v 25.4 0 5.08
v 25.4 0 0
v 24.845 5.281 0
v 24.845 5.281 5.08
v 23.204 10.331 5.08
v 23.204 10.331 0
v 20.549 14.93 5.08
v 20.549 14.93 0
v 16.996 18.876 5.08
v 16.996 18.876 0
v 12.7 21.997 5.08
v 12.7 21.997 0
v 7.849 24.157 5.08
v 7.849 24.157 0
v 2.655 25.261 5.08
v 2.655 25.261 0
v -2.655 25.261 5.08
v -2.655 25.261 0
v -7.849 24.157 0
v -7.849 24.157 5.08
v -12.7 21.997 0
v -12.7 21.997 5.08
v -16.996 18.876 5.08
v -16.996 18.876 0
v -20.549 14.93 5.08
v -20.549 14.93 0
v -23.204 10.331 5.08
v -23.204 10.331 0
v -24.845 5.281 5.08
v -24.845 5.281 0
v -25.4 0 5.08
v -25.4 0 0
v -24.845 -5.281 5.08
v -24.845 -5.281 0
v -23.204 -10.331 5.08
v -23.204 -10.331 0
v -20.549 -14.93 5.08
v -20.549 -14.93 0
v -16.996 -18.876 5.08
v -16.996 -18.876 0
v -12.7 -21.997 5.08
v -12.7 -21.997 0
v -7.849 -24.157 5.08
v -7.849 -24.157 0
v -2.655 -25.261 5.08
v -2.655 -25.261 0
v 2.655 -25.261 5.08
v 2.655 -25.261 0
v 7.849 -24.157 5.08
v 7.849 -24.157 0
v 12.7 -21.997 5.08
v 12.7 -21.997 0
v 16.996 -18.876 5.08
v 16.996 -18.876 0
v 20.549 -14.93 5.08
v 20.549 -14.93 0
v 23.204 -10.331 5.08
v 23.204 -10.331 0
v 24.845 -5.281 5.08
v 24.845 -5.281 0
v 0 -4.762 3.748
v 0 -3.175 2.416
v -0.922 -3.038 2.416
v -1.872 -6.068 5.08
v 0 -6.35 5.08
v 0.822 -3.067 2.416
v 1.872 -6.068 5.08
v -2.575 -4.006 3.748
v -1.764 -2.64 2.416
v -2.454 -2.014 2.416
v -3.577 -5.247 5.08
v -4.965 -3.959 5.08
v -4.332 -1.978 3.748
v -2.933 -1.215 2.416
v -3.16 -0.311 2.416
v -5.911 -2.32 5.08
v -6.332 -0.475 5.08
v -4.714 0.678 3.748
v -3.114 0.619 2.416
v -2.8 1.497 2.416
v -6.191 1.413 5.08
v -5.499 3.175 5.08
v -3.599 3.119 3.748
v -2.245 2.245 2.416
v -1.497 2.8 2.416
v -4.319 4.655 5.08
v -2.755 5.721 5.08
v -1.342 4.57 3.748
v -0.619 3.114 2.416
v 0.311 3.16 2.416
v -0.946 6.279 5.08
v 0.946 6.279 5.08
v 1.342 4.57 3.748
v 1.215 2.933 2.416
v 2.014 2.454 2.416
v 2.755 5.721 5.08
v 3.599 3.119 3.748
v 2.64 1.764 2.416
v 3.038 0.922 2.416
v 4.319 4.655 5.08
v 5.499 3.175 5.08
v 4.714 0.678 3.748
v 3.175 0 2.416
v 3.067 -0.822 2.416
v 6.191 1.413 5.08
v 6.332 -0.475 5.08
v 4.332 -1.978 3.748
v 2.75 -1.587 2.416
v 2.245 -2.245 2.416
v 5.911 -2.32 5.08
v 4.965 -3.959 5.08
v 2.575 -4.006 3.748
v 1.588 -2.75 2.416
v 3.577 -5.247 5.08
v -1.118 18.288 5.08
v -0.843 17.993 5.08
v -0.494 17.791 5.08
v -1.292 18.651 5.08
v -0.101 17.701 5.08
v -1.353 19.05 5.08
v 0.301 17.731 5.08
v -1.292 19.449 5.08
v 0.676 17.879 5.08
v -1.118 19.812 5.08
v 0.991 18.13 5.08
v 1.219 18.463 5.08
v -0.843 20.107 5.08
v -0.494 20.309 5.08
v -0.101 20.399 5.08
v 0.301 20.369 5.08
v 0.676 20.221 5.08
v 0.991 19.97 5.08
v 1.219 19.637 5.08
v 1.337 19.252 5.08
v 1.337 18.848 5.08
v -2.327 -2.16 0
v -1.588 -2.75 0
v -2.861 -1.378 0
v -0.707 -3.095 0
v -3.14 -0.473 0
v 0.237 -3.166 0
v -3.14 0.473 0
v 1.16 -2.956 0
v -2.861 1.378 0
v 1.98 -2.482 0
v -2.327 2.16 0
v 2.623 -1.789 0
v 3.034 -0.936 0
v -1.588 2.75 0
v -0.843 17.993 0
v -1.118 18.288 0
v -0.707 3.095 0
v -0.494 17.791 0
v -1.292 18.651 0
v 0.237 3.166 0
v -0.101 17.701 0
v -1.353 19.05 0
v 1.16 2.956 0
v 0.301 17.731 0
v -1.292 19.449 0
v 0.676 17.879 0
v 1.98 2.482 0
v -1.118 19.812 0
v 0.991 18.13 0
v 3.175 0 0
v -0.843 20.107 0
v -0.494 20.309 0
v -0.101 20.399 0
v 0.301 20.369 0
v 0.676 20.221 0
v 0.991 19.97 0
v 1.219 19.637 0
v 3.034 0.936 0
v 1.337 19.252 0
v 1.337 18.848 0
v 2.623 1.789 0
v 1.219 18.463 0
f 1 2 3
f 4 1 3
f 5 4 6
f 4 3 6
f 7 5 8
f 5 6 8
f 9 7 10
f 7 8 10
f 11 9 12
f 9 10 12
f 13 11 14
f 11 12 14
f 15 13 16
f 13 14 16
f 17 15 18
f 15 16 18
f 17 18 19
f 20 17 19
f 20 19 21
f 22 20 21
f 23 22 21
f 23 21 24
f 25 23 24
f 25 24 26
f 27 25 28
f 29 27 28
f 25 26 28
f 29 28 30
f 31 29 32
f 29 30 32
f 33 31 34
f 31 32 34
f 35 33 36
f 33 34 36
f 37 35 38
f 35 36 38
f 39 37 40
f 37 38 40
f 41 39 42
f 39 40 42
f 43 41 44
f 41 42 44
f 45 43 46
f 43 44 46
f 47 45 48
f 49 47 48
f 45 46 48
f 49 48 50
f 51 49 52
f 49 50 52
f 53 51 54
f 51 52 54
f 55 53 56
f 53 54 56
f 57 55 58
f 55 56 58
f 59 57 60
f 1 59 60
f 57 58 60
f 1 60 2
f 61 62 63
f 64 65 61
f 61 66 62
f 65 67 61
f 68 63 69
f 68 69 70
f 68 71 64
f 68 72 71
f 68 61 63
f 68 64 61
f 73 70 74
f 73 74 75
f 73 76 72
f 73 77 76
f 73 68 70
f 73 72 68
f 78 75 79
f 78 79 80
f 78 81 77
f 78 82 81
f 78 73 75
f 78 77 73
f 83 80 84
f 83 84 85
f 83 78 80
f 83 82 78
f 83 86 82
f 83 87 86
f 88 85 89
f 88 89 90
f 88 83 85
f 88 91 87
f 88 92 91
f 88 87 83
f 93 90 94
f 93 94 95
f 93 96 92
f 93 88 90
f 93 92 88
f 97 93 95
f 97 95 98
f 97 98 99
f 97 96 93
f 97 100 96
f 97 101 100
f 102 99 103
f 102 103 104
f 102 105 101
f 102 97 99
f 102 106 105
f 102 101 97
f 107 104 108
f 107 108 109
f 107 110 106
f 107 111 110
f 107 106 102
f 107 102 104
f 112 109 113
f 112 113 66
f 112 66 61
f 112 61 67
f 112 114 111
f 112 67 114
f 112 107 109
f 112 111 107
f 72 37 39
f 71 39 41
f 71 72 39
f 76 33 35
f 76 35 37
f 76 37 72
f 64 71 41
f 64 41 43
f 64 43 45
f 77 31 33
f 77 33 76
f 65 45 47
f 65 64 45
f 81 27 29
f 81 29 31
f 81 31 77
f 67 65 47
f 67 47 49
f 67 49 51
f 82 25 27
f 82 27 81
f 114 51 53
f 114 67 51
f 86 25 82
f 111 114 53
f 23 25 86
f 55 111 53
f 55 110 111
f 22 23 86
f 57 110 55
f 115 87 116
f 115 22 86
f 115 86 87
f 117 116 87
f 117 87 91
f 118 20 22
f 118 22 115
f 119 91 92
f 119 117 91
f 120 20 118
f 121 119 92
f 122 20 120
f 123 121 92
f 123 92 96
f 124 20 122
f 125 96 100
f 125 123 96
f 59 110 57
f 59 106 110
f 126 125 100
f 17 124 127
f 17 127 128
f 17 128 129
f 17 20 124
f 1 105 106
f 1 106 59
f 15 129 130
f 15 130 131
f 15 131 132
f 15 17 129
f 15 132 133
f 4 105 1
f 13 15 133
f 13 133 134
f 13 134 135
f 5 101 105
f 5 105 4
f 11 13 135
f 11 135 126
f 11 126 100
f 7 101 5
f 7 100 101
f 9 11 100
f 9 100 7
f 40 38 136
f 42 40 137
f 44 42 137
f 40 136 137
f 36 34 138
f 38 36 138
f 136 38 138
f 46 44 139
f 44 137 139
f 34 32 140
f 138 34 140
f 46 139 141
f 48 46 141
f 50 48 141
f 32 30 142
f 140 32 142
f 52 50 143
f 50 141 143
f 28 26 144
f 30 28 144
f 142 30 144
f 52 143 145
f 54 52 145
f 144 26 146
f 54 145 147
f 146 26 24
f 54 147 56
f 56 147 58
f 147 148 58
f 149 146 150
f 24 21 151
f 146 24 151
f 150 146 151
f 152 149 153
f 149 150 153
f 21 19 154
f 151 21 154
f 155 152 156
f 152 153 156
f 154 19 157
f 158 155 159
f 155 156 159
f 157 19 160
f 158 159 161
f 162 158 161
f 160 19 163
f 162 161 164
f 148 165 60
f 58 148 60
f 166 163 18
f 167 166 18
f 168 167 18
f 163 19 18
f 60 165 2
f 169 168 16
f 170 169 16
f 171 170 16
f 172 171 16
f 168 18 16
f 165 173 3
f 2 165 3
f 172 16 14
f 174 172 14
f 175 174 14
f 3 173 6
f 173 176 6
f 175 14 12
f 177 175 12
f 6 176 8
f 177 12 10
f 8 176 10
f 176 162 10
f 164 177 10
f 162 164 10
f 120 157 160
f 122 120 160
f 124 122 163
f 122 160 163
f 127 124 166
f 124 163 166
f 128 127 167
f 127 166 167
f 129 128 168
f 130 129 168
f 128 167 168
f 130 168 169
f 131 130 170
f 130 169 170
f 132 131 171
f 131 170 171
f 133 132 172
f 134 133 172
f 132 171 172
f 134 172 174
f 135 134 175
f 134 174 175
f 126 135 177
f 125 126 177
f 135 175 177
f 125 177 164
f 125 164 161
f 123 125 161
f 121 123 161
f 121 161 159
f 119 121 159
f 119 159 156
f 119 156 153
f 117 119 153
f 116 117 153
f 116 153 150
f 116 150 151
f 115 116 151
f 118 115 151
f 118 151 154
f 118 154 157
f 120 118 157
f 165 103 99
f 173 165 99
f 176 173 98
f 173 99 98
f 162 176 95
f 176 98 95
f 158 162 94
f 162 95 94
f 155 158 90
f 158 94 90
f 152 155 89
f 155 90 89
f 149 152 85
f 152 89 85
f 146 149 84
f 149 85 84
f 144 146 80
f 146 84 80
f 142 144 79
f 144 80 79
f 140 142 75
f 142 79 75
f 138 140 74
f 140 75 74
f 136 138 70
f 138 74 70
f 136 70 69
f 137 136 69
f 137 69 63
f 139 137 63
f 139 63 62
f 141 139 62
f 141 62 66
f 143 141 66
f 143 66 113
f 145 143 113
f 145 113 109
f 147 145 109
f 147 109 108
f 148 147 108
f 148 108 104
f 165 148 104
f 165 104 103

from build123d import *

# Parameters (mm, degrees)
SKETCH1_R             = 25.4
DISC_BASE_DEPTH       = 5.08
SKETCH2_R             = 3.175
CUT_EXTRUDE2_DEPTH    = 37.278456417
F_6_32_TAPPED_HOLE1_D = 2.7051


with BuildPart() as part:
    # Sketch1 → Disc Base (new body)
    with BuildSketch(Plane.XY):
        Circle(SKETCH1_R)
    extrude(amount=DISC_BASE_DEPTH)

    # Sketch10 → CSK for 1/4 Flat Head Machine Screw (100)1 (revolve, cut)
    with BuildSketch(Plane(origin=(0, 0, 5.08), x_dir=(0, -1, 0), z_dir=(1, 0, 0))):
        Polygon((0, 0), (0, 2.54), (3.175, 0.632267535), (3.175, 2.664141329), (6.35, 0), align=None)
    revolve(axis=Axis((0, 0, 11.43), (0, 0, -1)), mode=Mode.SUBTRACT)

    # Sketch2 → Cut-Extrude2 (cut, through all)
    with BuildSketch(Plane.XY.offset(5.08)):
        Circle(SKETCH2_R)
    extrude(amount=-CUT_EXTRUDE2_DEPTH, mode=Mode.SUBTRACT)

    # #6-32 Tapped Hole1 (through all)
    with Locations(Plane(origin=(0, 19.05, 5.08), x_dir=(1, 0, 0), z_dir=(0, 0, 1))):
        with Locations((0, 0)):
            Hole(F_6_32_TAPPED_HOLE1_D / 2)


solid = part.part
